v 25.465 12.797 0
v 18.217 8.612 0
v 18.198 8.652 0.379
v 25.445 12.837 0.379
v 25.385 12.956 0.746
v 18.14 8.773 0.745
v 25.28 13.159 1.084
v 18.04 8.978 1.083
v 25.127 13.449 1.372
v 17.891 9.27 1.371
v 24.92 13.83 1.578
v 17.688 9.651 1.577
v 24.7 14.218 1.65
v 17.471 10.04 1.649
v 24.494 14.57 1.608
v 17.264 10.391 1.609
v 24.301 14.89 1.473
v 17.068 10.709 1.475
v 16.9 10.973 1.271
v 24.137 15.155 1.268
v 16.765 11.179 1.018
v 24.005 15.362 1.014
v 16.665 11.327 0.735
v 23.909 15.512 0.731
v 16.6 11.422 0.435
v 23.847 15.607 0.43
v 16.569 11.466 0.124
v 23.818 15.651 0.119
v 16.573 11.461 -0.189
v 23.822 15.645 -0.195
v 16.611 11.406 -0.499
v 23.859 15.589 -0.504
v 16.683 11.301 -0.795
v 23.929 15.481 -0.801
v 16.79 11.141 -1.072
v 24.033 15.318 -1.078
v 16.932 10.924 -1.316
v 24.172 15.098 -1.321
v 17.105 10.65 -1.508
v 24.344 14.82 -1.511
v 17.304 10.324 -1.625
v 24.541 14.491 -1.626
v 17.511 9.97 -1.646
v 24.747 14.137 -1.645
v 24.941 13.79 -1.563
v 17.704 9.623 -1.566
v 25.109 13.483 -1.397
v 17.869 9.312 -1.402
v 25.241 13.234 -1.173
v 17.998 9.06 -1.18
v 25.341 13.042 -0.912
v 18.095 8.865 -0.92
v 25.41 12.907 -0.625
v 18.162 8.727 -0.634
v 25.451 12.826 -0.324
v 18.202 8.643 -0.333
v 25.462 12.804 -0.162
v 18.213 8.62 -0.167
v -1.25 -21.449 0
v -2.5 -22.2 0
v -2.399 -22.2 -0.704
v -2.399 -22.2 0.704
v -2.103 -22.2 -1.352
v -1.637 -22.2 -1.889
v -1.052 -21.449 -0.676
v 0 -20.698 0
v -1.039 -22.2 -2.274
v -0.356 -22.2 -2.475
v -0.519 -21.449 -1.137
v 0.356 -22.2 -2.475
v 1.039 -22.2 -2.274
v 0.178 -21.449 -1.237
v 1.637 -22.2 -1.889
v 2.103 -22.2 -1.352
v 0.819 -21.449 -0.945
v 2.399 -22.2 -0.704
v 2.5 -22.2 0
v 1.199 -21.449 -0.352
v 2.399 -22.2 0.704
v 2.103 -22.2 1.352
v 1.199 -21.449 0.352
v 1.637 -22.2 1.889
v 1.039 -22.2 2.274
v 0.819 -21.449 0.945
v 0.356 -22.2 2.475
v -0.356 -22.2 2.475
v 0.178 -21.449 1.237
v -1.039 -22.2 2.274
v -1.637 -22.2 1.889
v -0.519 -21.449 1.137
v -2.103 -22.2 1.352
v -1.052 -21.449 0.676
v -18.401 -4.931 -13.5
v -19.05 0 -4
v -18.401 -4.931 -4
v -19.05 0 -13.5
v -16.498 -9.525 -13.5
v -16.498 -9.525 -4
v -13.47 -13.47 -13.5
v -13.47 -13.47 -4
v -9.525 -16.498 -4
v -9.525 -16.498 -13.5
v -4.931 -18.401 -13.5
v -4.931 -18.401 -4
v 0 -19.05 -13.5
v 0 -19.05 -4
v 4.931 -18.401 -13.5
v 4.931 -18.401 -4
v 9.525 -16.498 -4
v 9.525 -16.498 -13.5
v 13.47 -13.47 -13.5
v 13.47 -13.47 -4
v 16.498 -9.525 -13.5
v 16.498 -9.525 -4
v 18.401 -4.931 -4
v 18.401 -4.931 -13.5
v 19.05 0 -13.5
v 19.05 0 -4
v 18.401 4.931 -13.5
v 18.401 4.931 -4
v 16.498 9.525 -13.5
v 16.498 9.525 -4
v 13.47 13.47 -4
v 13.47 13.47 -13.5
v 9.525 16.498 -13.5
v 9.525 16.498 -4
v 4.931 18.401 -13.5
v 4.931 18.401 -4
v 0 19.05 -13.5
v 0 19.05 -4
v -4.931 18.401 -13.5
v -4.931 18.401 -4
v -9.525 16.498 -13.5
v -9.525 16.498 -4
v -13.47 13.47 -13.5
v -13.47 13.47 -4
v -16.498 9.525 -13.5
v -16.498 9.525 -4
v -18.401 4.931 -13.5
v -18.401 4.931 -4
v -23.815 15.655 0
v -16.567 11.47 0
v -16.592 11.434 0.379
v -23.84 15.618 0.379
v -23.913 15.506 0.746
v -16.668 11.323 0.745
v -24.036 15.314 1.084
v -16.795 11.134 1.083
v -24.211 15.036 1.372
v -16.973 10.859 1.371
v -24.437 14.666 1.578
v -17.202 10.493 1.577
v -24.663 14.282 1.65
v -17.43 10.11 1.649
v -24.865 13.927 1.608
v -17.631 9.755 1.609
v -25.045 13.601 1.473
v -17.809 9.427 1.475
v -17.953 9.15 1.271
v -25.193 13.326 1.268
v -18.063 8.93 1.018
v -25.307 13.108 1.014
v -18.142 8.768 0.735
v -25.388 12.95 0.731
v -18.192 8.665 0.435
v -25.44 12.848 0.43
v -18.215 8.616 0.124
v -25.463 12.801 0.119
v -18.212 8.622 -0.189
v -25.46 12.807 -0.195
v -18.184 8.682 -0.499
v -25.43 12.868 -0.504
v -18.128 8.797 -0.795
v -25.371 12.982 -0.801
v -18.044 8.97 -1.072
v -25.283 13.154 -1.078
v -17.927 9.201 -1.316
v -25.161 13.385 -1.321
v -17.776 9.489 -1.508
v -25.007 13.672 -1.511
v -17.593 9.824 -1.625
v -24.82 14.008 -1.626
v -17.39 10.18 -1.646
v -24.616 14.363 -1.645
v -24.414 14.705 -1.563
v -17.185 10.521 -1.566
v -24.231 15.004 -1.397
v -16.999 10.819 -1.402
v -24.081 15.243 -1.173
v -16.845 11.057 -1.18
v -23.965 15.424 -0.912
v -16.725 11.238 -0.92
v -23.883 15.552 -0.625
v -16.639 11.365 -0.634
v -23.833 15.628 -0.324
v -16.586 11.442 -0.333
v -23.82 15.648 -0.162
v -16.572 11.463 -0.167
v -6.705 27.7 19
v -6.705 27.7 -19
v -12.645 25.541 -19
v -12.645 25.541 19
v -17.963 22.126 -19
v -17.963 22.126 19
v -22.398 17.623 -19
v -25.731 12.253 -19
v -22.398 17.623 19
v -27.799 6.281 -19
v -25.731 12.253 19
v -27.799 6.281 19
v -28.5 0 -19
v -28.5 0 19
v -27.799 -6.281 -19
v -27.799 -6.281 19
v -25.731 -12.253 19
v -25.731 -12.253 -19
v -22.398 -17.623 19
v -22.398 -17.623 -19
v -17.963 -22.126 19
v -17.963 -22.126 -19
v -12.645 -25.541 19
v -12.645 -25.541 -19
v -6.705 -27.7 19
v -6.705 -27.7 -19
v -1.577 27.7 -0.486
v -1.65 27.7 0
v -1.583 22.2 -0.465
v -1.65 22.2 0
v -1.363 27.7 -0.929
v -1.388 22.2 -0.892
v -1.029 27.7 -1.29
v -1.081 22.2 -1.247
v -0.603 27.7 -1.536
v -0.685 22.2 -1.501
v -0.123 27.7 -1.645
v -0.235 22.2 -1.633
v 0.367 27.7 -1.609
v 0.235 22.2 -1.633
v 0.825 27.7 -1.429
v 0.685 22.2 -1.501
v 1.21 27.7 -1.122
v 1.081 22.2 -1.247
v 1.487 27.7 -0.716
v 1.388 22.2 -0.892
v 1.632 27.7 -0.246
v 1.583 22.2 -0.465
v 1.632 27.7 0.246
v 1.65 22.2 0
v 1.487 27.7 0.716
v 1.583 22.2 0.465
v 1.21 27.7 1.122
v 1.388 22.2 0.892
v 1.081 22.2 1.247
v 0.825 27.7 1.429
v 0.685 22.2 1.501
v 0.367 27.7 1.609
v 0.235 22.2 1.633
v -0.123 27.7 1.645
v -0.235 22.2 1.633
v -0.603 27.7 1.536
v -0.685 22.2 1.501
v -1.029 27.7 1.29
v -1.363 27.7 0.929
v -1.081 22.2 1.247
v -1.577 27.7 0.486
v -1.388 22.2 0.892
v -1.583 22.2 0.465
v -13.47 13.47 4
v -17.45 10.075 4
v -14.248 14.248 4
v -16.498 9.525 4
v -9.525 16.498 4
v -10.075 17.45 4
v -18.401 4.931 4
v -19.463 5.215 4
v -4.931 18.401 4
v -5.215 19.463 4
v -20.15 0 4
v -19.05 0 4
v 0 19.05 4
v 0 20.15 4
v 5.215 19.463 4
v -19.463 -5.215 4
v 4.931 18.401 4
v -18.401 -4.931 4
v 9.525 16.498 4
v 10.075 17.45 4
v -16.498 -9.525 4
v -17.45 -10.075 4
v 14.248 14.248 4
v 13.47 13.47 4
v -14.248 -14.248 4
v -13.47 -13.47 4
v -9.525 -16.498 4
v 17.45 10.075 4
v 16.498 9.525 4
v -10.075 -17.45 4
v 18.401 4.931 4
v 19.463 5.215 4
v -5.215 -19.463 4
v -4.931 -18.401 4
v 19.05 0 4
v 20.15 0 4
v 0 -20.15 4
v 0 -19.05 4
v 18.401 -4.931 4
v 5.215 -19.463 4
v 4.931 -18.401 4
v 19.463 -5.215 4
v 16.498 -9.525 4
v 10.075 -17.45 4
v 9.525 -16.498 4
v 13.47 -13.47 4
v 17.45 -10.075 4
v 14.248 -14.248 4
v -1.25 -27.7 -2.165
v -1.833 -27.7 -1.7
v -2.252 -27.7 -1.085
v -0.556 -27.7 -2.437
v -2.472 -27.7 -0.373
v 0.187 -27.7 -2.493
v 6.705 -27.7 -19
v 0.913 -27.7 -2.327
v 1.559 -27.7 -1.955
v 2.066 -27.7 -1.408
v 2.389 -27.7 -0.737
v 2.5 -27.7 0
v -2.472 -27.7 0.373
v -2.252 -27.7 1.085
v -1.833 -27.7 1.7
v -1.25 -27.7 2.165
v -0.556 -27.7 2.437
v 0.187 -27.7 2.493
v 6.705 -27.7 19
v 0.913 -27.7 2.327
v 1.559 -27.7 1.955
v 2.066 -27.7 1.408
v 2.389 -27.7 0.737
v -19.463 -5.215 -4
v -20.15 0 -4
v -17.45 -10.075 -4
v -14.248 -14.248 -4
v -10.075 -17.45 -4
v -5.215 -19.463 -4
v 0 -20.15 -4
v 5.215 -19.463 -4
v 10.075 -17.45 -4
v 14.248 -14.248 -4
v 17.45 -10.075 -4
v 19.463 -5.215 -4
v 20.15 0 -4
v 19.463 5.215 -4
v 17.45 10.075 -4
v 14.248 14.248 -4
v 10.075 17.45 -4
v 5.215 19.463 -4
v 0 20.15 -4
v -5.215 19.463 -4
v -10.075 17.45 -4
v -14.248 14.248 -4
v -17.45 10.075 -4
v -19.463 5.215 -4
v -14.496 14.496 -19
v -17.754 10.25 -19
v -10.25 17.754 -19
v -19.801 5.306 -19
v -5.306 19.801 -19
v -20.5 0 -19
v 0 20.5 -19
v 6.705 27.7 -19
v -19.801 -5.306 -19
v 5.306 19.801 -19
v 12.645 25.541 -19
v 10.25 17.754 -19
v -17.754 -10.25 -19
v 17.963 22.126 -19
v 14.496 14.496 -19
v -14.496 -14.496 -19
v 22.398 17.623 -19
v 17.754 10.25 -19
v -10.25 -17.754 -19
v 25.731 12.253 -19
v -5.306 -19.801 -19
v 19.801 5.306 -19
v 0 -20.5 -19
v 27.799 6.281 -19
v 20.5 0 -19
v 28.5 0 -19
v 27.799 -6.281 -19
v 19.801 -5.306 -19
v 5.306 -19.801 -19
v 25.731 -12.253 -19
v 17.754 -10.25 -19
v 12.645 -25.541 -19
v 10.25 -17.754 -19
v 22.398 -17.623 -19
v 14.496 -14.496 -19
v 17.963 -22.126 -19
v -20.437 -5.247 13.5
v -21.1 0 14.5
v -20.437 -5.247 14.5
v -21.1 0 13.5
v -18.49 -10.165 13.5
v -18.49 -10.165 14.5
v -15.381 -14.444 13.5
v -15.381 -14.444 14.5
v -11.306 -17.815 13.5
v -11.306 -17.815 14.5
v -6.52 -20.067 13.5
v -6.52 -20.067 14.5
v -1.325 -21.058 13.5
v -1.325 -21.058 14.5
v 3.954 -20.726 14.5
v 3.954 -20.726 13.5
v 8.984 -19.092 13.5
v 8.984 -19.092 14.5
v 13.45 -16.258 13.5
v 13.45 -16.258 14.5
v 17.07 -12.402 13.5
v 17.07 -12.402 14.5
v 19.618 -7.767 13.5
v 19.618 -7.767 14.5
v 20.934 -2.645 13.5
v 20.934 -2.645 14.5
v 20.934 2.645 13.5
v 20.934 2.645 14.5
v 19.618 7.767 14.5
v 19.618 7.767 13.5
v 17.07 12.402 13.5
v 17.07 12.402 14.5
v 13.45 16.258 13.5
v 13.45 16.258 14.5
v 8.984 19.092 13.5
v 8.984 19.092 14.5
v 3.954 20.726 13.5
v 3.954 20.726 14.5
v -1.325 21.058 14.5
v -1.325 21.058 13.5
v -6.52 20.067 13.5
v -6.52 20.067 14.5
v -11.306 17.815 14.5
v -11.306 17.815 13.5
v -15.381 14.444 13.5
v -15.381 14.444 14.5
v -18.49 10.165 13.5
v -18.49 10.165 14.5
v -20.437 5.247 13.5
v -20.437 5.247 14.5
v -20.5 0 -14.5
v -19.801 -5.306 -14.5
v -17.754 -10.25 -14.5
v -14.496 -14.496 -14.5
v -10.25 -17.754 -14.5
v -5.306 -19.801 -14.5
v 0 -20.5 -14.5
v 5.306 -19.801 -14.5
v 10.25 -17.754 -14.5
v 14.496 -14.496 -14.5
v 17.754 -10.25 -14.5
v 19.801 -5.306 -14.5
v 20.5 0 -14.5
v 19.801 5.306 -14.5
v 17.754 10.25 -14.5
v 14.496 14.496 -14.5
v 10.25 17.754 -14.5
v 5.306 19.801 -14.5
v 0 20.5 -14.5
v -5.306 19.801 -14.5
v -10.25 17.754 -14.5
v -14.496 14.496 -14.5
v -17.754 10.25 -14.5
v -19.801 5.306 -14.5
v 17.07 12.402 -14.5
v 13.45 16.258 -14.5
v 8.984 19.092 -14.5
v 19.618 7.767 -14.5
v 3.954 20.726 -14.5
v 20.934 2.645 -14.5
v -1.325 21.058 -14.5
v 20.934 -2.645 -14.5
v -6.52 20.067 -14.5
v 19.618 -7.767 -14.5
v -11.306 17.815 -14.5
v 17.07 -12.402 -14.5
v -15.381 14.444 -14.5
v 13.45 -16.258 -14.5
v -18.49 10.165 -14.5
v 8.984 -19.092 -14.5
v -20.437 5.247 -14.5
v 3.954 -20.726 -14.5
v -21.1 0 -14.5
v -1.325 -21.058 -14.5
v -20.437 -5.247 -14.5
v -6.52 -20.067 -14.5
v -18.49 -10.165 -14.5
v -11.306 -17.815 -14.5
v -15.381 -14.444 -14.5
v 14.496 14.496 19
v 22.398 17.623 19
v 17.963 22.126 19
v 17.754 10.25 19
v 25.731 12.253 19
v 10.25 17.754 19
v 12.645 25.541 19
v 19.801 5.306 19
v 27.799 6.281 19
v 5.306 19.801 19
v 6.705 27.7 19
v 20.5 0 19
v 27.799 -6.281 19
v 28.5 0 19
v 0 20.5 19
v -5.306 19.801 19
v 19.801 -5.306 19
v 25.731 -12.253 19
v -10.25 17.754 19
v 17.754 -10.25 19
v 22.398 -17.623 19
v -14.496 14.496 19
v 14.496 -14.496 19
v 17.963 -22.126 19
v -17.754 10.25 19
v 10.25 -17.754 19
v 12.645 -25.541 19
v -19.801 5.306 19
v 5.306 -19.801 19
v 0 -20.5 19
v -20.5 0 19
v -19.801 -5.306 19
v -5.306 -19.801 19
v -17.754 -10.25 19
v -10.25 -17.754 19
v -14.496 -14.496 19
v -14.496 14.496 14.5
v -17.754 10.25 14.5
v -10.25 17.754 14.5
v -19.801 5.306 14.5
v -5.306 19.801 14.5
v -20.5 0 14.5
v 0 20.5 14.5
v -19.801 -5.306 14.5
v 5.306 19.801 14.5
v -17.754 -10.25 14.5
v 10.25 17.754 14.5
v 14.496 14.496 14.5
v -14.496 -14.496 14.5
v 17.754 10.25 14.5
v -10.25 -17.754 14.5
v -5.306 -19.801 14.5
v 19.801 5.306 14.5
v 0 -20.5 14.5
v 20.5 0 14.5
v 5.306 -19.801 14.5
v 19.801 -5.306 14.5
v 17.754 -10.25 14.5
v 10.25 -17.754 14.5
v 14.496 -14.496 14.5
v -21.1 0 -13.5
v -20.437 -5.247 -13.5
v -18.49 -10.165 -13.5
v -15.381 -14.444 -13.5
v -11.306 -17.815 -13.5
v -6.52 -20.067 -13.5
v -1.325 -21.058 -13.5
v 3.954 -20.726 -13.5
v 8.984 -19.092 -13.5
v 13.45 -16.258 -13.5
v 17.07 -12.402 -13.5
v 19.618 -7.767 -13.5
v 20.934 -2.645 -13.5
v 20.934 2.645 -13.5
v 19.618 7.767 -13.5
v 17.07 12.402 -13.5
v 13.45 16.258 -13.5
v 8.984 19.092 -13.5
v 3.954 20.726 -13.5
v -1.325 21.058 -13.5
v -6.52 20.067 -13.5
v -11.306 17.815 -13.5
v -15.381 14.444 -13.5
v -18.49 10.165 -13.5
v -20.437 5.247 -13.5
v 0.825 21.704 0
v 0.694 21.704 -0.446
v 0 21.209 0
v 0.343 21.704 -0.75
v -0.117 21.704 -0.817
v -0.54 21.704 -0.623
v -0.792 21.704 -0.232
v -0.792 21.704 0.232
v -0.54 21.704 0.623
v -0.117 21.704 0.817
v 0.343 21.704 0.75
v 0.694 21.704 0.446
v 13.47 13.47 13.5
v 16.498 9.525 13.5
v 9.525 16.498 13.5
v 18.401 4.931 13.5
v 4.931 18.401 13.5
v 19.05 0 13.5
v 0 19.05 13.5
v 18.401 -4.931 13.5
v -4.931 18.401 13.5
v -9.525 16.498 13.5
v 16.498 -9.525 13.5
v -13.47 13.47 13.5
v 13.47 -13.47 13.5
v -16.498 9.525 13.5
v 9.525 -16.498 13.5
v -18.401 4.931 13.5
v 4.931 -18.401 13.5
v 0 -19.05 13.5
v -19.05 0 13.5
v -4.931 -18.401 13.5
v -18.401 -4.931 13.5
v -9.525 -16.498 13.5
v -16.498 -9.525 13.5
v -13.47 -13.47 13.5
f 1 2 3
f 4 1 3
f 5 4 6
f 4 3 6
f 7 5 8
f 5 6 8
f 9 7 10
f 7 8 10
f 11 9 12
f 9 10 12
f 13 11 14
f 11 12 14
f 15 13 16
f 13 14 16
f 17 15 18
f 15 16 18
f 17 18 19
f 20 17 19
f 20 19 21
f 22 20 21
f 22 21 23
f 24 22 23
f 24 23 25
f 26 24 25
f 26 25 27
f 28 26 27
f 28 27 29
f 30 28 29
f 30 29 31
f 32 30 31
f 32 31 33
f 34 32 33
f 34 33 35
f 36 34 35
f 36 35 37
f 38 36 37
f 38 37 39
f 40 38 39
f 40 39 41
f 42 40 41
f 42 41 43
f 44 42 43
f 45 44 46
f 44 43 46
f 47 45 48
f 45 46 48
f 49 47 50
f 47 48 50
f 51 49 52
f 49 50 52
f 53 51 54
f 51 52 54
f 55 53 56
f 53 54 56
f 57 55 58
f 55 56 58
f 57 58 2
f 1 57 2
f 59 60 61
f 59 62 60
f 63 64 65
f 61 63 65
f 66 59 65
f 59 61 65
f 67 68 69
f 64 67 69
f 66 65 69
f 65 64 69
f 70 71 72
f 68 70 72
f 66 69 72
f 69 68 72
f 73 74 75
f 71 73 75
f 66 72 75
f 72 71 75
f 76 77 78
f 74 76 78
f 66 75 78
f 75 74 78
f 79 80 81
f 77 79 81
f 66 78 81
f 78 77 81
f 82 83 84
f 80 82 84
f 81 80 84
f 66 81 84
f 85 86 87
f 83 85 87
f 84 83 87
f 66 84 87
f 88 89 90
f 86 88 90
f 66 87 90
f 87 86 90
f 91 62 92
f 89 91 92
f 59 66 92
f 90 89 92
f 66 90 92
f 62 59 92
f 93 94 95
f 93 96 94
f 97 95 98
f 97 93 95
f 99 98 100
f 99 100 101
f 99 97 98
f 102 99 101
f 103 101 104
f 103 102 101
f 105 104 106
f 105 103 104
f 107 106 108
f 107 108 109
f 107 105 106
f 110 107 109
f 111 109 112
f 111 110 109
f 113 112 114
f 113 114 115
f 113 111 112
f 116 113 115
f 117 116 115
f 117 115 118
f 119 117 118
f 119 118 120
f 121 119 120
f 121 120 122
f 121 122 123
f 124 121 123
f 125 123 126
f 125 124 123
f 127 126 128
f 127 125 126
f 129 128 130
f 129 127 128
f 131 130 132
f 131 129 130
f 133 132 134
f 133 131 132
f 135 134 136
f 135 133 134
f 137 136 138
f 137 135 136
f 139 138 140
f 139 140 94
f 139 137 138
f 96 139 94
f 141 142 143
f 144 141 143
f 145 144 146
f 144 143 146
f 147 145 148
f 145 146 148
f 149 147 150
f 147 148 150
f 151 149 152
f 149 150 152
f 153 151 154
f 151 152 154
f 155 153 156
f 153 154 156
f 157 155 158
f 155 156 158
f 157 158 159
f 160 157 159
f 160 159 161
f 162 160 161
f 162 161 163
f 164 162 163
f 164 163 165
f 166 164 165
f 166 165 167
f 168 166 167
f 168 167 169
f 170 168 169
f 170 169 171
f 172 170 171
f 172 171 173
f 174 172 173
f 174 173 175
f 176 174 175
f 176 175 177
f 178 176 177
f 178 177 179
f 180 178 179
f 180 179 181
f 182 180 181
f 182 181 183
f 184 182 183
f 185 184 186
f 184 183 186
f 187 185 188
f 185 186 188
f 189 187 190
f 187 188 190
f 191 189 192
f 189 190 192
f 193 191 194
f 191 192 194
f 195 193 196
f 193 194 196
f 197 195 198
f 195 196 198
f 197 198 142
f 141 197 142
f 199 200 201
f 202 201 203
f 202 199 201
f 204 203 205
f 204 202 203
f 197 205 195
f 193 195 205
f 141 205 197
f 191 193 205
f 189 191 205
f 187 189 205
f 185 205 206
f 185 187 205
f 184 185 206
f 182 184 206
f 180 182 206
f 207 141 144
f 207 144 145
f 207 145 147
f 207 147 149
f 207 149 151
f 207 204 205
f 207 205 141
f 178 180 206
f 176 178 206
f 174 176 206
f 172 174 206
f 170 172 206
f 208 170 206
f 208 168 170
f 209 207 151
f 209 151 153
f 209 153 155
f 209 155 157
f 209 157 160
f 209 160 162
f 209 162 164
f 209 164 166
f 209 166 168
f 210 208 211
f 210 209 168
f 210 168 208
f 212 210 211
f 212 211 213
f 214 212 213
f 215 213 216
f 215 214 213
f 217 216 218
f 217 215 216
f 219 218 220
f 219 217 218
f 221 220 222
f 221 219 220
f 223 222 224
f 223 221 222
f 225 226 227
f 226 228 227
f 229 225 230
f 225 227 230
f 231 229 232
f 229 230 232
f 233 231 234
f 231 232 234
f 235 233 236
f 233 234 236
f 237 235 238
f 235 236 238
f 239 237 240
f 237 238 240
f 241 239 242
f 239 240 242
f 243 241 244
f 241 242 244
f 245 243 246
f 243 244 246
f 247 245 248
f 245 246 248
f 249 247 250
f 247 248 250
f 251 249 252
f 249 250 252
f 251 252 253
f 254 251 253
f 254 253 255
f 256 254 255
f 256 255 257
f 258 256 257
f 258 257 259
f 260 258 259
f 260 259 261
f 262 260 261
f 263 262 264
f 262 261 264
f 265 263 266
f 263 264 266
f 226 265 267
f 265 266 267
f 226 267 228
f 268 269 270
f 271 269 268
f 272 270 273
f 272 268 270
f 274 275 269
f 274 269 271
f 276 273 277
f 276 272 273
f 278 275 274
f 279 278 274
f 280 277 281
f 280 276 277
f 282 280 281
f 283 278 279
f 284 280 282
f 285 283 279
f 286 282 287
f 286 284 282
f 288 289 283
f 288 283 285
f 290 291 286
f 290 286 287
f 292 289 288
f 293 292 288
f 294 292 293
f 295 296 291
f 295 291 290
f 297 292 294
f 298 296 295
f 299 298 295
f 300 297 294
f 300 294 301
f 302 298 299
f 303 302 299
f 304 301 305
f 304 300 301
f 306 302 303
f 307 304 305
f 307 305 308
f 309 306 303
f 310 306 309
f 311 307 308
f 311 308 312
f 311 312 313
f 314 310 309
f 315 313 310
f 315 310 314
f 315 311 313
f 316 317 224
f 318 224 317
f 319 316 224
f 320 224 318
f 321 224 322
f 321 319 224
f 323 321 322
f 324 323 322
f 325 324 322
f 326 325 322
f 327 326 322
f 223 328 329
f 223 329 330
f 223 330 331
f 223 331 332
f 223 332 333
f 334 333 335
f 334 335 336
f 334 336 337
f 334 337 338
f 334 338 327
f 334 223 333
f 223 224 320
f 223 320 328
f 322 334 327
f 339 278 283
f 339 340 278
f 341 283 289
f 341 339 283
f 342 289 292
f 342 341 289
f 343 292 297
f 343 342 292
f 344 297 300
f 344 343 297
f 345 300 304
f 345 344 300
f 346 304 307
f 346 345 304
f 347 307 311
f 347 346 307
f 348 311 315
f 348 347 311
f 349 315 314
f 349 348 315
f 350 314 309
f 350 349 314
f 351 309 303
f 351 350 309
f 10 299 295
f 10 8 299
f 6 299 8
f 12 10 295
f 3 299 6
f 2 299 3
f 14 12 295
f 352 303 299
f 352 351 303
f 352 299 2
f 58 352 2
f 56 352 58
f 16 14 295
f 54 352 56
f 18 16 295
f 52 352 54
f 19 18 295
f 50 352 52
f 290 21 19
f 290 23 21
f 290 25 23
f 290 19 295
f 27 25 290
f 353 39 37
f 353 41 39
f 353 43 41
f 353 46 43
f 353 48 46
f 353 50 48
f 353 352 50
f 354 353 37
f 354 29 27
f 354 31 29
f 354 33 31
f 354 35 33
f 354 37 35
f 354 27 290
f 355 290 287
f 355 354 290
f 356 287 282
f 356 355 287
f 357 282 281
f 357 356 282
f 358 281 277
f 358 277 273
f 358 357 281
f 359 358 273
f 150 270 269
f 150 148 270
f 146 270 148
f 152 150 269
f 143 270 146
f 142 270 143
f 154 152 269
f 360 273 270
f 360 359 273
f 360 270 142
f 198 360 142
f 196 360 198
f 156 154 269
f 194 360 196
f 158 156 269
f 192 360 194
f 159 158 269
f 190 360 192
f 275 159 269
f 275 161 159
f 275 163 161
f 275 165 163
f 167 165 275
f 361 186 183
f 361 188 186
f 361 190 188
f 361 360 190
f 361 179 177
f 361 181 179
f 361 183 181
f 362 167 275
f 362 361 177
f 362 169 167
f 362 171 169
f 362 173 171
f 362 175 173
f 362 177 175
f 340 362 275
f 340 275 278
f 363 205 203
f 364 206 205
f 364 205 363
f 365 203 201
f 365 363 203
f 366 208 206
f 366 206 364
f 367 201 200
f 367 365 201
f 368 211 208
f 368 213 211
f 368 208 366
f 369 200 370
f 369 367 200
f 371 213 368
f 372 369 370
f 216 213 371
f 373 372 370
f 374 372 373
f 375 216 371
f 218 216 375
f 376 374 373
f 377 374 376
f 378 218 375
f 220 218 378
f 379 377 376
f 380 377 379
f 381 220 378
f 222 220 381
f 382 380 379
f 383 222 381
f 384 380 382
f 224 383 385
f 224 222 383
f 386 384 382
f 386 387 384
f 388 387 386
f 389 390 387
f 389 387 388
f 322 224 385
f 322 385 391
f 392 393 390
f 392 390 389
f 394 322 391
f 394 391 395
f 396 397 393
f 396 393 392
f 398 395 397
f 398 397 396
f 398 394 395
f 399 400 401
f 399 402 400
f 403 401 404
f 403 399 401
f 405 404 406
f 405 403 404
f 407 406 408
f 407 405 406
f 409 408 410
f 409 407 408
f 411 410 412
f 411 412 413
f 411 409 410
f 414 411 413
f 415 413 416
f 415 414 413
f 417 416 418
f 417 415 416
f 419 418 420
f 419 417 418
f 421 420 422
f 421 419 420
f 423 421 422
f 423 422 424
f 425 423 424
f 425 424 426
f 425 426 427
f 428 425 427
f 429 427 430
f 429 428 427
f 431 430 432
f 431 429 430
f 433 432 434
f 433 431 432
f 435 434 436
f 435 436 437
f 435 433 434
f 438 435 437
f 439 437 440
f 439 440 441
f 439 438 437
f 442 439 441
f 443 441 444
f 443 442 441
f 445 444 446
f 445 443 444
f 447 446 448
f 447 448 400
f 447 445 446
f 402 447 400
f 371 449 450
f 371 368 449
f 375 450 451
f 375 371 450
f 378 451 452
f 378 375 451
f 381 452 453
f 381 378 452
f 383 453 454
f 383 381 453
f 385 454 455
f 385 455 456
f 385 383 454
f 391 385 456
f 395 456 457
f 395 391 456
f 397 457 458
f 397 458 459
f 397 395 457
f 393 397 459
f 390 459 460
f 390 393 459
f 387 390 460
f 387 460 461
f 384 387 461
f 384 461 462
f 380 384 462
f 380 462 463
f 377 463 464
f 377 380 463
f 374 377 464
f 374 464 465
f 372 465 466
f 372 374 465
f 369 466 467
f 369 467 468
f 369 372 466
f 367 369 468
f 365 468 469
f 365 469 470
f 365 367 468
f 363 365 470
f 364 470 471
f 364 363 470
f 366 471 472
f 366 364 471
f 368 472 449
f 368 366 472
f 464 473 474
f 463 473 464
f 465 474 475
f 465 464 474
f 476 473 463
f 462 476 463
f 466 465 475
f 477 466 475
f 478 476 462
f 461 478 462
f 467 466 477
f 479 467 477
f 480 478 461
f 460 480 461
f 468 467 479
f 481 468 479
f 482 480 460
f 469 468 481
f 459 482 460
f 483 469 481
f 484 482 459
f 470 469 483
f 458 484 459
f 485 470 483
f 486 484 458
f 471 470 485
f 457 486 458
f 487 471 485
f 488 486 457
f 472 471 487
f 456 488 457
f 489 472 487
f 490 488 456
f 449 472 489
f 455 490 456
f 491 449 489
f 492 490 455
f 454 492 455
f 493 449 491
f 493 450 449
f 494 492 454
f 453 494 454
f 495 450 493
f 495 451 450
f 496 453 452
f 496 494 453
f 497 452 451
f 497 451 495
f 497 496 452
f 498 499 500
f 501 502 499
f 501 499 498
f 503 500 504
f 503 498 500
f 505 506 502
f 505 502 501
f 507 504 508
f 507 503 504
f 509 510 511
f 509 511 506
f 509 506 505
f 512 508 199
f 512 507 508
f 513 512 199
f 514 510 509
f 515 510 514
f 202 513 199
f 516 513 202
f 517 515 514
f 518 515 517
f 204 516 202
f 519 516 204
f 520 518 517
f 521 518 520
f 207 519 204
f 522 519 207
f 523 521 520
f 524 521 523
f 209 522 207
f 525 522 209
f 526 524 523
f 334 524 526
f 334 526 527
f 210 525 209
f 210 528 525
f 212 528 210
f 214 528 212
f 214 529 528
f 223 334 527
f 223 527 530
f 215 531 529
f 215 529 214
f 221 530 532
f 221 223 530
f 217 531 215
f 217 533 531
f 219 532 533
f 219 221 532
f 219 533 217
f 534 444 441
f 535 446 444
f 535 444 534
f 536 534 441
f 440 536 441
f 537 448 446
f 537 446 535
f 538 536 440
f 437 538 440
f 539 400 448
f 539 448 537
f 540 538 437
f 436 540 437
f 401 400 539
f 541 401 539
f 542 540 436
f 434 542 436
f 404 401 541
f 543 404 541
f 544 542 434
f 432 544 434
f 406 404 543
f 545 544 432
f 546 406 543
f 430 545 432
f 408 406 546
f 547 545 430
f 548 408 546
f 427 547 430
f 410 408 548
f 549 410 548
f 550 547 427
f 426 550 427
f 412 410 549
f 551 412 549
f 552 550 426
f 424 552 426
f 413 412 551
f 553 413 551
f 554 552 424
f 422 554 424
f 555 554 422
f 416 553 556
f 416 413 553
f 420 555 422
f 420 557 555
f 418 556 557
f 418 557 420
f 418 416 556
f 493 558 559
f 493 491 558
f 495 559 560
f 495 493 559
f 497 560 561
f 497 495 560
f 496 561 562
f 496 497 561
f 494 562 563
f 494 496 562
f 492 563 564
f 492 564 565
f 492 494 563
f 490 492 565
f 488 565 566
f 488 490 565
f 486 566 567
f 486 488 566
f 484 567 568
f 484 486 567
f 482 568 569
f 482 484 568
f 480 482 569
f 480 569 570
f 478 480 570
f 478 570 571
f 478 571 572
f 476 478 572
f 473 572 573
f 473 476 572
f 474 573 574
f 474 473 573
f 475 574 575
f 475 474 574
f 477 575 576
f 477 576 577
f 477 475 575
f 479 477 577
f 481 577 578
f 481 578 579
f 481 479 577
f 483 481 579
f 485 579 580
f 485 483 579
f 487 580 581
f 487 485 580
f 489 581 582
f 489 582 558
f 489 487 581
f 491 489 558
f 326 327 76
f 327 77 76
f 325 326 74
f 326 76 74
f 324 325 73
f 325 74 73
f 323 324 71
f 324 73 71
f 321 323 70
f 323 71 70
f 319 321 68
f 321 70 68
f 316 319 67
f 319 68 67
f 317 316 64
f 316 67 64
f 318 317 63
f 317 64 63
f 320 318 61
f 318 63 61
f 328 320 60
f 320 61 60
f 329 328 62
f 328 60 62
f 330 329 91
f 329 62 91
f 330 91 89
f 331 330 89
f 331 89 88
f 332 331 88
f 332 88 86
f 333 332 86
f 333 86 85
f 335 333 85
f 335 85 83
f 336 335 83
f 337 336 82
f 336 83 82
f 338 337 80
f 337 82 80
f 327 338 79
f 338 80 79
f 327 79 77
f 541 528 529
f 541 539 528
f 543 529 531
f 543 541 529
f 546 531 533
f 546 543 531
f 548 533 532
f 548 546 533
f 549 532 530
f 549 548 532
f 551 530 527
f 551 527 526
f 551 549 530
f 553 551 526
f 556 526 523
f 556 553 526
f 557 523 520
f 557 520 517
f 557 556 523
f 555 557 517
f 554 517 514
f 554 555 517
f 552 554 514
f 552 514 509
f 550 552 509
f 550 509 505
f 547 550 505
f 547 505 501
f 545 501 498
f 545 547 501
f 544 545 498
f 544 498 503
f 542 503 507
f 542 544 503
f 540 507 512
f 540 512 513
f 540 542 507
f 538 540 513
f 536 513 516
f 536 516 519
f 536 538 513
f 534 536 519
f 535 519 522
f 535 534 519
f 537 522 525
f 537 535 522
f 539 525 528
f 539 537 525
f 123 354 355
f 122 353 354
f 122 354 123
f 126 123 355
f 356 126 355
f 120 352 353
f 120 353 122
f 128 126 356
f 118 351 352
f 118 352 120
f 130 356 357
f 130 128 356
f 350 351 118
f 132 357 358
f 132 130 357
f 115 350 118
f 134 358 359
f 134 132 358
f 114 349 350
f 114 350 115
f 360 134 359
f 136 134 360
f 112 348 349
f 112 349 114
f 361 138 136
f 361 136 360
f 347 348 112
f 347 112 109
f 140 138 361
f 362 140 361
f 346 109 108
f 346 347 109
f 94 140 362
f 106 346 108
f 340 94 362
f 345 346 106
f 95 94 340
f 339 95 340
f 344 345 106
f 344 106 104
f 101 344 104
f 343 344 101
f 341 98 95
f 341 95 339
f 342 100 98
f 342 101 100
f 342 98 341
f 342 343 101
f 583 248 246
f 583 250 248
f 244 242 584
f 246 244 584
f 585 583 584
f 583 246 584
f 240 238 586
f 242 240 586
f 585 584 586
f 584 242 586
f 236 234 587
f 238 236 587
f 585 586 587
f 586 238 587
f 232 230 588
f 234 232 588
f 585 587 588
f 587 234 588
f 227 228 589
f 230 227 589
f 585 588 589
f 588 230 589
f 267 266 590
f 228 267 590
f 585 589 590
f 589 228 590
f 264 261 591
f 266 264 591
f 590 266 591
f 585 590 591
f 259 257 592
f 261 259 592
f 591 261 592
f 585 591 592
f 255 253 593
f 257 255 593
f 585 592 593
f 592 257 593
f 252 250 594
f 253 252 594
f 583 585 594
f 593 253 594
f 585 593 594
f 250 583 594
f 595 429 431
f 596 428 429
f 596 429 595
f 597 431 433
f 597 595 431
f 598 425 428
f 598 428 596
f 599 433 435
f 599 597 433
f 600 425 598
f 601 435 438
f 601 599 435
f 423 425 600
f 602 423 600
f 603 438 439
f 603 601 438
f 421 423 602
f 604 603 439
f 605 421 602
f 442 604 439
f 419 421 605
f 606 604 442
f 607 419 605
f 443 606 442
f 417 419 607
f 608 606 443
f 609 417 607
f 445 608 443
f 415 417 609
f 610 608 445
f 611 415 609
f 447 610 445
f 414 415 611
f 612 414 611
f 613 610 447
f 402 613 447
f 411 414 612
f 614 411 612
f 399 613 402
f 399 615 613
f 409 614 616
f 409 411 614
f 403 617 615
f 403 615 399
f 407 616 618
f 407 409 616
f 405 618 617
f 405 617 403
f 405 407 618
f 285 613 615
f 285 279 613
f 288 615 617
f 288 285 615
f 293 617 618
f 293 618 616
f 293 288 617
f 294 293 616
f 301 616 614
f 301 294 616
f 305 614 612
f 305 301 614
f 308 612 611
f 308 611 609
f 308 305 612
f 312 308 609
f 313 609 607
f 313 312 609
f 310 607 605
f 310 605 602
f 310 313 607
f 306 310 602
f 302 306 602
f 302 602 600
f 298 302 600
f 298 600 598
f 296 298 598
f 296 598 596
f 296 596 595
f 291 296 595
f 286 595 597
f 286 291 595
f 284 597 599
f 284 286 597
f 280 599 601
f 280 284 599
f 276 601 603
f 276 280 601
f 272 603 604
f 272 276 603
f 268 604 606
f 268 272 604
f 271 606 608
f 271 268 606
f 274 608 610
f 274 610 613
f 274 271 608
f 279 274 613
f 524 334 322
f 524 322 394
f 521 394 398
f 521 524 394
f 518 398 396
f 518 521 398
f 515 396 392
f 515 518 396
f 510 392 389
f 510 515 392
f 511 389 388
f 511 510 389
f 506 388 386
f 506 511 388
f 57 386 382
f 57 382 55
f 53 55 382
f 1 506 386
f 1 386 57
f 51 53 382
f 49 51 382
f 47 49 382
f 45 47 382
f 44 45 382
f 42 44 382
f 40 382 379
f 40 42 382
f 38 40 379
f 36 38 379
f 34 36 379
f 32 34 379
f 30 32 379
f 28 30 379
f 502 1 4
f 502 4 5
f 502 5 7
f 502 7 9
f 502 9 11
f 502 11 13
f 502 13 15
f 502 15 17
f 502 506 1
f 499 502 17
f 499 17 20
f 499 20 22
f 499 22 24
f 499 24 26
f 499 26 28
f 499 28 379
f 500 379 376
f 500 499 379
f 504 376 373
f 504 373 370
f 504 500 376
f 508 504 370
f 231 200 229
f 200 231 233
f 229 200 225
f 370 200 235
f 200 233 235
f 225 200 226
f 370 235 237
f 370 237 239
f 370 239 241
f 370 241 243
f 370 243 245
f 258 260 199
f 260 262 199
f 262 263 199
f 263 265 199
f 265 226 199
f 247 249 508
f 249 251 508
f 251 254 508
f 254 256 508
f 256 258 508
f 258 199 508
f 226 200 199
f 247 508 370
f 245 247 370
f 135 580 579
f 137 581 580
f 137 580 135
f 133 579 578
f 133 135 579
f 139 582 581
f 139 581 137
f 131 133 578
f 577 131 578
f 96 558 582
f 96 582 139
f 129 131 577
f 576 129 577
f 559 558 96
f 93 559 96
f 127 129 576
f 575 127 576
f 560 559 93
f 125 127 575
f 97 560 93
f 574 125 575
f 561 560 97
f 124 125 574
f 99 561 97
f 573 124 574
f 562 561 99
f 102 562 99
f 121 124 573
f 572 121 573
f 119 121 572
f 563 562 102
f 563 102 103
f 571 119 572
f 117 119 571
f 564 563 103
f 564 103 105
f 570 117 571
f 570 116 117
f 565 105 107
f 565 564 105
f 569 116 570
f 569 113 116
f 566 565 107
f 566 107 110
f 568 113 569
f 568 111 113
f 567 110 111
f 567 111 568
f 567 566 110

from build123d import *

# Parameters (mm, degrees)
SKETCH_2_W                       = 64.02174429
SKETCH_2_H                       = 9.248919907
CUT_EXTRUDE_1_DEPTH              = 49
HOLE_WIZARD_M4_2_D               = 3.3
HOLE_WIZARD_M4_2_DEPTH           = 5.5
HOLE_WIZARD_M4_2_TIP             = 0.991420021
HOLE_WIZARD_M6_2_D               = 5
HOLE_WIZARD_M6_2_DEPTH           = 5.5
HOLE_WIZARD_M6_2_TIP             = 1.502151548
HOLE_WIZARD_M4_3_D               = 3.3
HOLE_WIZARD_M4_3_DEPTH           = 10.1
HOLE_WIZARD_M4_3_TIP             = 0.991420021
HOLE_WIZARD_M4_3_ON_FACE_2_D     = 3.3
HOLE_WIZARD_M4_3_ON_FACE_2_DEPTH = 10.1
HOLE_WIZARD_M4_3_ON_FACE_2_TIP   = 0.991420021


with BuildPart() as part:
    # 草图1 → 旋转1 (revolve)
    with BuildSketch(Plane(origin=(0, 0, 0), x_dir=(1, 0, 0), z_dir=(0, 1, 0)), mode=Mode.PRIVATE) as revolve_1_sk:
        Polygon((28.5, 19), (28.5, -19), (20.5, -19), (20.5, -14.5), (21.1, -14.5), (21.1, -13.5), (19.05, -13.5), (19.05, -4), (20.15, -4), (20.15, 4), (19.05, 4), (19.05, 13.5), (21.1, 13.5), (21.1, 14.5), (20.5, 14.5), (20.5, 19), align=None)
    revolve(revolve_1_sk.sketch.rotate(Axis((0, 0, -31.9390681), (0, 0, 1)), 180), axis=Axis((0, 0, -31.9390681), (0, 0, 1)))  # turned: the seam where the file's is

    # 草图2 → 切除-拉伸1 (cut)
    with BuildSketch(Plane.XY.offset(19)):
        with Locations((-1.141100508, 32.324459954)):
            Rectangle(SKETCH_2_W, SKETCH_2_H)
        with Locations((-1.141100508, -32.324459954)):
            Rectangle(SKETCH_2_W, SKETCH_2_H)
    extrude(amount=-CUT_EXTRUDE_1_DEPTH, mode=Mode.SUBTRACT)

    # M4 螺纹孔2
    with Locations(Plane(origin=(0, 27.7, 0), x_dir=(1, 0, 0), z_dir=(0, 1, 0))):
        with Locations((0, 0)):
            Hole(HOLE_WIZARD_M4_2_D / 2, depth=HOLE_WIZARD_M4_2_DEPTH)
            with Locations((0, 0, -(HOLE_WIZARD_M4_2_DEPTH + HOLE_WIZARD_M4_2_TIP / 2))):  # 118° drill point
                Cone(0, HOLE_WIZARD_M4_2_D / 2, HOLE_WIZARD_M4_2_TIP, mode=Mode.SUBTRACT)

    # M6 螺纹孔2
    with Locations(Plane(origin=(0, -27.7, 0), x_dir=(-1, 0, 0), z_dir=(0, -1, 0))):
        with Locations((0, 0)):
            Hole(HOLE_WIZARD_M6_2_D / 2, depth=HOLE_WIZARD_M6_2_DEPTH)
            with Locations((0, 0, -(HOLE_WIZARD_M6_2_DEPTH + HOLE_WIZARD_M6_2_TIP / 2))):  # 118° drill point
                Cone(0, HOLE_WIZARD_M6_2_D / 2, HOLE_WIZARD_M6_2_TIP, mode=Mode.SUBTRACT)

    # M4 螺纹孔3
    with Locations(Plane(origin=(24.681724008, 14.25, 0), x_dir=(-0.5, 0.866025404, 0), z_dir=(0.866025404, 0.5, 0))):
        with Locations((0, 0)):
            Hole(HOLE_WIZARD_M4_3_D / 2, depth=HOLE_WIZARD_M4_3_DEPTH)
            with Locations((0, 0, -(HOLE_WIZARD_M4_3_DEPTH + HOLE_WIZARD_M4_3_TIP / 2))):  # 118° drill point
                Cone(0, HOLE_WIZARD_M4_3_D / 2, HOLE_WIZARD_M4_3_TIP, mode=Mode.SUBTRACT)

    # M4 螺纹孔3 on face 2
    with Locations(Plane(origin=(-24.681724008, 14.25, 0), x_dir=(-0.500000175, -0.866025303, 0), z_dir=(-0.866025303, 0.500000175, 0))):
        with Locations((0, 0)):
            Hole(HOLE_WIZARD_M4_3_ON_FACE_2_D / 2, depth=HOLE_WIZARD_M4_3_ON_FACE_2_DEPTH)
            with Locations((0, 0, -(HOLE_WIZARD_M4_3_ON_FACE_2_DEPTH + HOLE_WIZARD_M4_3_ON_FACE_2_TIP / 2))):  # 118° drill point
                Cone(0, HOLE_WIZARD_M4_3_ON_FACE_2_D / 2, HOLE_WIZARD_M4_3_ON_FACE_2_TIP, mode=Mode.SUBTRACT)


solid = part.part
